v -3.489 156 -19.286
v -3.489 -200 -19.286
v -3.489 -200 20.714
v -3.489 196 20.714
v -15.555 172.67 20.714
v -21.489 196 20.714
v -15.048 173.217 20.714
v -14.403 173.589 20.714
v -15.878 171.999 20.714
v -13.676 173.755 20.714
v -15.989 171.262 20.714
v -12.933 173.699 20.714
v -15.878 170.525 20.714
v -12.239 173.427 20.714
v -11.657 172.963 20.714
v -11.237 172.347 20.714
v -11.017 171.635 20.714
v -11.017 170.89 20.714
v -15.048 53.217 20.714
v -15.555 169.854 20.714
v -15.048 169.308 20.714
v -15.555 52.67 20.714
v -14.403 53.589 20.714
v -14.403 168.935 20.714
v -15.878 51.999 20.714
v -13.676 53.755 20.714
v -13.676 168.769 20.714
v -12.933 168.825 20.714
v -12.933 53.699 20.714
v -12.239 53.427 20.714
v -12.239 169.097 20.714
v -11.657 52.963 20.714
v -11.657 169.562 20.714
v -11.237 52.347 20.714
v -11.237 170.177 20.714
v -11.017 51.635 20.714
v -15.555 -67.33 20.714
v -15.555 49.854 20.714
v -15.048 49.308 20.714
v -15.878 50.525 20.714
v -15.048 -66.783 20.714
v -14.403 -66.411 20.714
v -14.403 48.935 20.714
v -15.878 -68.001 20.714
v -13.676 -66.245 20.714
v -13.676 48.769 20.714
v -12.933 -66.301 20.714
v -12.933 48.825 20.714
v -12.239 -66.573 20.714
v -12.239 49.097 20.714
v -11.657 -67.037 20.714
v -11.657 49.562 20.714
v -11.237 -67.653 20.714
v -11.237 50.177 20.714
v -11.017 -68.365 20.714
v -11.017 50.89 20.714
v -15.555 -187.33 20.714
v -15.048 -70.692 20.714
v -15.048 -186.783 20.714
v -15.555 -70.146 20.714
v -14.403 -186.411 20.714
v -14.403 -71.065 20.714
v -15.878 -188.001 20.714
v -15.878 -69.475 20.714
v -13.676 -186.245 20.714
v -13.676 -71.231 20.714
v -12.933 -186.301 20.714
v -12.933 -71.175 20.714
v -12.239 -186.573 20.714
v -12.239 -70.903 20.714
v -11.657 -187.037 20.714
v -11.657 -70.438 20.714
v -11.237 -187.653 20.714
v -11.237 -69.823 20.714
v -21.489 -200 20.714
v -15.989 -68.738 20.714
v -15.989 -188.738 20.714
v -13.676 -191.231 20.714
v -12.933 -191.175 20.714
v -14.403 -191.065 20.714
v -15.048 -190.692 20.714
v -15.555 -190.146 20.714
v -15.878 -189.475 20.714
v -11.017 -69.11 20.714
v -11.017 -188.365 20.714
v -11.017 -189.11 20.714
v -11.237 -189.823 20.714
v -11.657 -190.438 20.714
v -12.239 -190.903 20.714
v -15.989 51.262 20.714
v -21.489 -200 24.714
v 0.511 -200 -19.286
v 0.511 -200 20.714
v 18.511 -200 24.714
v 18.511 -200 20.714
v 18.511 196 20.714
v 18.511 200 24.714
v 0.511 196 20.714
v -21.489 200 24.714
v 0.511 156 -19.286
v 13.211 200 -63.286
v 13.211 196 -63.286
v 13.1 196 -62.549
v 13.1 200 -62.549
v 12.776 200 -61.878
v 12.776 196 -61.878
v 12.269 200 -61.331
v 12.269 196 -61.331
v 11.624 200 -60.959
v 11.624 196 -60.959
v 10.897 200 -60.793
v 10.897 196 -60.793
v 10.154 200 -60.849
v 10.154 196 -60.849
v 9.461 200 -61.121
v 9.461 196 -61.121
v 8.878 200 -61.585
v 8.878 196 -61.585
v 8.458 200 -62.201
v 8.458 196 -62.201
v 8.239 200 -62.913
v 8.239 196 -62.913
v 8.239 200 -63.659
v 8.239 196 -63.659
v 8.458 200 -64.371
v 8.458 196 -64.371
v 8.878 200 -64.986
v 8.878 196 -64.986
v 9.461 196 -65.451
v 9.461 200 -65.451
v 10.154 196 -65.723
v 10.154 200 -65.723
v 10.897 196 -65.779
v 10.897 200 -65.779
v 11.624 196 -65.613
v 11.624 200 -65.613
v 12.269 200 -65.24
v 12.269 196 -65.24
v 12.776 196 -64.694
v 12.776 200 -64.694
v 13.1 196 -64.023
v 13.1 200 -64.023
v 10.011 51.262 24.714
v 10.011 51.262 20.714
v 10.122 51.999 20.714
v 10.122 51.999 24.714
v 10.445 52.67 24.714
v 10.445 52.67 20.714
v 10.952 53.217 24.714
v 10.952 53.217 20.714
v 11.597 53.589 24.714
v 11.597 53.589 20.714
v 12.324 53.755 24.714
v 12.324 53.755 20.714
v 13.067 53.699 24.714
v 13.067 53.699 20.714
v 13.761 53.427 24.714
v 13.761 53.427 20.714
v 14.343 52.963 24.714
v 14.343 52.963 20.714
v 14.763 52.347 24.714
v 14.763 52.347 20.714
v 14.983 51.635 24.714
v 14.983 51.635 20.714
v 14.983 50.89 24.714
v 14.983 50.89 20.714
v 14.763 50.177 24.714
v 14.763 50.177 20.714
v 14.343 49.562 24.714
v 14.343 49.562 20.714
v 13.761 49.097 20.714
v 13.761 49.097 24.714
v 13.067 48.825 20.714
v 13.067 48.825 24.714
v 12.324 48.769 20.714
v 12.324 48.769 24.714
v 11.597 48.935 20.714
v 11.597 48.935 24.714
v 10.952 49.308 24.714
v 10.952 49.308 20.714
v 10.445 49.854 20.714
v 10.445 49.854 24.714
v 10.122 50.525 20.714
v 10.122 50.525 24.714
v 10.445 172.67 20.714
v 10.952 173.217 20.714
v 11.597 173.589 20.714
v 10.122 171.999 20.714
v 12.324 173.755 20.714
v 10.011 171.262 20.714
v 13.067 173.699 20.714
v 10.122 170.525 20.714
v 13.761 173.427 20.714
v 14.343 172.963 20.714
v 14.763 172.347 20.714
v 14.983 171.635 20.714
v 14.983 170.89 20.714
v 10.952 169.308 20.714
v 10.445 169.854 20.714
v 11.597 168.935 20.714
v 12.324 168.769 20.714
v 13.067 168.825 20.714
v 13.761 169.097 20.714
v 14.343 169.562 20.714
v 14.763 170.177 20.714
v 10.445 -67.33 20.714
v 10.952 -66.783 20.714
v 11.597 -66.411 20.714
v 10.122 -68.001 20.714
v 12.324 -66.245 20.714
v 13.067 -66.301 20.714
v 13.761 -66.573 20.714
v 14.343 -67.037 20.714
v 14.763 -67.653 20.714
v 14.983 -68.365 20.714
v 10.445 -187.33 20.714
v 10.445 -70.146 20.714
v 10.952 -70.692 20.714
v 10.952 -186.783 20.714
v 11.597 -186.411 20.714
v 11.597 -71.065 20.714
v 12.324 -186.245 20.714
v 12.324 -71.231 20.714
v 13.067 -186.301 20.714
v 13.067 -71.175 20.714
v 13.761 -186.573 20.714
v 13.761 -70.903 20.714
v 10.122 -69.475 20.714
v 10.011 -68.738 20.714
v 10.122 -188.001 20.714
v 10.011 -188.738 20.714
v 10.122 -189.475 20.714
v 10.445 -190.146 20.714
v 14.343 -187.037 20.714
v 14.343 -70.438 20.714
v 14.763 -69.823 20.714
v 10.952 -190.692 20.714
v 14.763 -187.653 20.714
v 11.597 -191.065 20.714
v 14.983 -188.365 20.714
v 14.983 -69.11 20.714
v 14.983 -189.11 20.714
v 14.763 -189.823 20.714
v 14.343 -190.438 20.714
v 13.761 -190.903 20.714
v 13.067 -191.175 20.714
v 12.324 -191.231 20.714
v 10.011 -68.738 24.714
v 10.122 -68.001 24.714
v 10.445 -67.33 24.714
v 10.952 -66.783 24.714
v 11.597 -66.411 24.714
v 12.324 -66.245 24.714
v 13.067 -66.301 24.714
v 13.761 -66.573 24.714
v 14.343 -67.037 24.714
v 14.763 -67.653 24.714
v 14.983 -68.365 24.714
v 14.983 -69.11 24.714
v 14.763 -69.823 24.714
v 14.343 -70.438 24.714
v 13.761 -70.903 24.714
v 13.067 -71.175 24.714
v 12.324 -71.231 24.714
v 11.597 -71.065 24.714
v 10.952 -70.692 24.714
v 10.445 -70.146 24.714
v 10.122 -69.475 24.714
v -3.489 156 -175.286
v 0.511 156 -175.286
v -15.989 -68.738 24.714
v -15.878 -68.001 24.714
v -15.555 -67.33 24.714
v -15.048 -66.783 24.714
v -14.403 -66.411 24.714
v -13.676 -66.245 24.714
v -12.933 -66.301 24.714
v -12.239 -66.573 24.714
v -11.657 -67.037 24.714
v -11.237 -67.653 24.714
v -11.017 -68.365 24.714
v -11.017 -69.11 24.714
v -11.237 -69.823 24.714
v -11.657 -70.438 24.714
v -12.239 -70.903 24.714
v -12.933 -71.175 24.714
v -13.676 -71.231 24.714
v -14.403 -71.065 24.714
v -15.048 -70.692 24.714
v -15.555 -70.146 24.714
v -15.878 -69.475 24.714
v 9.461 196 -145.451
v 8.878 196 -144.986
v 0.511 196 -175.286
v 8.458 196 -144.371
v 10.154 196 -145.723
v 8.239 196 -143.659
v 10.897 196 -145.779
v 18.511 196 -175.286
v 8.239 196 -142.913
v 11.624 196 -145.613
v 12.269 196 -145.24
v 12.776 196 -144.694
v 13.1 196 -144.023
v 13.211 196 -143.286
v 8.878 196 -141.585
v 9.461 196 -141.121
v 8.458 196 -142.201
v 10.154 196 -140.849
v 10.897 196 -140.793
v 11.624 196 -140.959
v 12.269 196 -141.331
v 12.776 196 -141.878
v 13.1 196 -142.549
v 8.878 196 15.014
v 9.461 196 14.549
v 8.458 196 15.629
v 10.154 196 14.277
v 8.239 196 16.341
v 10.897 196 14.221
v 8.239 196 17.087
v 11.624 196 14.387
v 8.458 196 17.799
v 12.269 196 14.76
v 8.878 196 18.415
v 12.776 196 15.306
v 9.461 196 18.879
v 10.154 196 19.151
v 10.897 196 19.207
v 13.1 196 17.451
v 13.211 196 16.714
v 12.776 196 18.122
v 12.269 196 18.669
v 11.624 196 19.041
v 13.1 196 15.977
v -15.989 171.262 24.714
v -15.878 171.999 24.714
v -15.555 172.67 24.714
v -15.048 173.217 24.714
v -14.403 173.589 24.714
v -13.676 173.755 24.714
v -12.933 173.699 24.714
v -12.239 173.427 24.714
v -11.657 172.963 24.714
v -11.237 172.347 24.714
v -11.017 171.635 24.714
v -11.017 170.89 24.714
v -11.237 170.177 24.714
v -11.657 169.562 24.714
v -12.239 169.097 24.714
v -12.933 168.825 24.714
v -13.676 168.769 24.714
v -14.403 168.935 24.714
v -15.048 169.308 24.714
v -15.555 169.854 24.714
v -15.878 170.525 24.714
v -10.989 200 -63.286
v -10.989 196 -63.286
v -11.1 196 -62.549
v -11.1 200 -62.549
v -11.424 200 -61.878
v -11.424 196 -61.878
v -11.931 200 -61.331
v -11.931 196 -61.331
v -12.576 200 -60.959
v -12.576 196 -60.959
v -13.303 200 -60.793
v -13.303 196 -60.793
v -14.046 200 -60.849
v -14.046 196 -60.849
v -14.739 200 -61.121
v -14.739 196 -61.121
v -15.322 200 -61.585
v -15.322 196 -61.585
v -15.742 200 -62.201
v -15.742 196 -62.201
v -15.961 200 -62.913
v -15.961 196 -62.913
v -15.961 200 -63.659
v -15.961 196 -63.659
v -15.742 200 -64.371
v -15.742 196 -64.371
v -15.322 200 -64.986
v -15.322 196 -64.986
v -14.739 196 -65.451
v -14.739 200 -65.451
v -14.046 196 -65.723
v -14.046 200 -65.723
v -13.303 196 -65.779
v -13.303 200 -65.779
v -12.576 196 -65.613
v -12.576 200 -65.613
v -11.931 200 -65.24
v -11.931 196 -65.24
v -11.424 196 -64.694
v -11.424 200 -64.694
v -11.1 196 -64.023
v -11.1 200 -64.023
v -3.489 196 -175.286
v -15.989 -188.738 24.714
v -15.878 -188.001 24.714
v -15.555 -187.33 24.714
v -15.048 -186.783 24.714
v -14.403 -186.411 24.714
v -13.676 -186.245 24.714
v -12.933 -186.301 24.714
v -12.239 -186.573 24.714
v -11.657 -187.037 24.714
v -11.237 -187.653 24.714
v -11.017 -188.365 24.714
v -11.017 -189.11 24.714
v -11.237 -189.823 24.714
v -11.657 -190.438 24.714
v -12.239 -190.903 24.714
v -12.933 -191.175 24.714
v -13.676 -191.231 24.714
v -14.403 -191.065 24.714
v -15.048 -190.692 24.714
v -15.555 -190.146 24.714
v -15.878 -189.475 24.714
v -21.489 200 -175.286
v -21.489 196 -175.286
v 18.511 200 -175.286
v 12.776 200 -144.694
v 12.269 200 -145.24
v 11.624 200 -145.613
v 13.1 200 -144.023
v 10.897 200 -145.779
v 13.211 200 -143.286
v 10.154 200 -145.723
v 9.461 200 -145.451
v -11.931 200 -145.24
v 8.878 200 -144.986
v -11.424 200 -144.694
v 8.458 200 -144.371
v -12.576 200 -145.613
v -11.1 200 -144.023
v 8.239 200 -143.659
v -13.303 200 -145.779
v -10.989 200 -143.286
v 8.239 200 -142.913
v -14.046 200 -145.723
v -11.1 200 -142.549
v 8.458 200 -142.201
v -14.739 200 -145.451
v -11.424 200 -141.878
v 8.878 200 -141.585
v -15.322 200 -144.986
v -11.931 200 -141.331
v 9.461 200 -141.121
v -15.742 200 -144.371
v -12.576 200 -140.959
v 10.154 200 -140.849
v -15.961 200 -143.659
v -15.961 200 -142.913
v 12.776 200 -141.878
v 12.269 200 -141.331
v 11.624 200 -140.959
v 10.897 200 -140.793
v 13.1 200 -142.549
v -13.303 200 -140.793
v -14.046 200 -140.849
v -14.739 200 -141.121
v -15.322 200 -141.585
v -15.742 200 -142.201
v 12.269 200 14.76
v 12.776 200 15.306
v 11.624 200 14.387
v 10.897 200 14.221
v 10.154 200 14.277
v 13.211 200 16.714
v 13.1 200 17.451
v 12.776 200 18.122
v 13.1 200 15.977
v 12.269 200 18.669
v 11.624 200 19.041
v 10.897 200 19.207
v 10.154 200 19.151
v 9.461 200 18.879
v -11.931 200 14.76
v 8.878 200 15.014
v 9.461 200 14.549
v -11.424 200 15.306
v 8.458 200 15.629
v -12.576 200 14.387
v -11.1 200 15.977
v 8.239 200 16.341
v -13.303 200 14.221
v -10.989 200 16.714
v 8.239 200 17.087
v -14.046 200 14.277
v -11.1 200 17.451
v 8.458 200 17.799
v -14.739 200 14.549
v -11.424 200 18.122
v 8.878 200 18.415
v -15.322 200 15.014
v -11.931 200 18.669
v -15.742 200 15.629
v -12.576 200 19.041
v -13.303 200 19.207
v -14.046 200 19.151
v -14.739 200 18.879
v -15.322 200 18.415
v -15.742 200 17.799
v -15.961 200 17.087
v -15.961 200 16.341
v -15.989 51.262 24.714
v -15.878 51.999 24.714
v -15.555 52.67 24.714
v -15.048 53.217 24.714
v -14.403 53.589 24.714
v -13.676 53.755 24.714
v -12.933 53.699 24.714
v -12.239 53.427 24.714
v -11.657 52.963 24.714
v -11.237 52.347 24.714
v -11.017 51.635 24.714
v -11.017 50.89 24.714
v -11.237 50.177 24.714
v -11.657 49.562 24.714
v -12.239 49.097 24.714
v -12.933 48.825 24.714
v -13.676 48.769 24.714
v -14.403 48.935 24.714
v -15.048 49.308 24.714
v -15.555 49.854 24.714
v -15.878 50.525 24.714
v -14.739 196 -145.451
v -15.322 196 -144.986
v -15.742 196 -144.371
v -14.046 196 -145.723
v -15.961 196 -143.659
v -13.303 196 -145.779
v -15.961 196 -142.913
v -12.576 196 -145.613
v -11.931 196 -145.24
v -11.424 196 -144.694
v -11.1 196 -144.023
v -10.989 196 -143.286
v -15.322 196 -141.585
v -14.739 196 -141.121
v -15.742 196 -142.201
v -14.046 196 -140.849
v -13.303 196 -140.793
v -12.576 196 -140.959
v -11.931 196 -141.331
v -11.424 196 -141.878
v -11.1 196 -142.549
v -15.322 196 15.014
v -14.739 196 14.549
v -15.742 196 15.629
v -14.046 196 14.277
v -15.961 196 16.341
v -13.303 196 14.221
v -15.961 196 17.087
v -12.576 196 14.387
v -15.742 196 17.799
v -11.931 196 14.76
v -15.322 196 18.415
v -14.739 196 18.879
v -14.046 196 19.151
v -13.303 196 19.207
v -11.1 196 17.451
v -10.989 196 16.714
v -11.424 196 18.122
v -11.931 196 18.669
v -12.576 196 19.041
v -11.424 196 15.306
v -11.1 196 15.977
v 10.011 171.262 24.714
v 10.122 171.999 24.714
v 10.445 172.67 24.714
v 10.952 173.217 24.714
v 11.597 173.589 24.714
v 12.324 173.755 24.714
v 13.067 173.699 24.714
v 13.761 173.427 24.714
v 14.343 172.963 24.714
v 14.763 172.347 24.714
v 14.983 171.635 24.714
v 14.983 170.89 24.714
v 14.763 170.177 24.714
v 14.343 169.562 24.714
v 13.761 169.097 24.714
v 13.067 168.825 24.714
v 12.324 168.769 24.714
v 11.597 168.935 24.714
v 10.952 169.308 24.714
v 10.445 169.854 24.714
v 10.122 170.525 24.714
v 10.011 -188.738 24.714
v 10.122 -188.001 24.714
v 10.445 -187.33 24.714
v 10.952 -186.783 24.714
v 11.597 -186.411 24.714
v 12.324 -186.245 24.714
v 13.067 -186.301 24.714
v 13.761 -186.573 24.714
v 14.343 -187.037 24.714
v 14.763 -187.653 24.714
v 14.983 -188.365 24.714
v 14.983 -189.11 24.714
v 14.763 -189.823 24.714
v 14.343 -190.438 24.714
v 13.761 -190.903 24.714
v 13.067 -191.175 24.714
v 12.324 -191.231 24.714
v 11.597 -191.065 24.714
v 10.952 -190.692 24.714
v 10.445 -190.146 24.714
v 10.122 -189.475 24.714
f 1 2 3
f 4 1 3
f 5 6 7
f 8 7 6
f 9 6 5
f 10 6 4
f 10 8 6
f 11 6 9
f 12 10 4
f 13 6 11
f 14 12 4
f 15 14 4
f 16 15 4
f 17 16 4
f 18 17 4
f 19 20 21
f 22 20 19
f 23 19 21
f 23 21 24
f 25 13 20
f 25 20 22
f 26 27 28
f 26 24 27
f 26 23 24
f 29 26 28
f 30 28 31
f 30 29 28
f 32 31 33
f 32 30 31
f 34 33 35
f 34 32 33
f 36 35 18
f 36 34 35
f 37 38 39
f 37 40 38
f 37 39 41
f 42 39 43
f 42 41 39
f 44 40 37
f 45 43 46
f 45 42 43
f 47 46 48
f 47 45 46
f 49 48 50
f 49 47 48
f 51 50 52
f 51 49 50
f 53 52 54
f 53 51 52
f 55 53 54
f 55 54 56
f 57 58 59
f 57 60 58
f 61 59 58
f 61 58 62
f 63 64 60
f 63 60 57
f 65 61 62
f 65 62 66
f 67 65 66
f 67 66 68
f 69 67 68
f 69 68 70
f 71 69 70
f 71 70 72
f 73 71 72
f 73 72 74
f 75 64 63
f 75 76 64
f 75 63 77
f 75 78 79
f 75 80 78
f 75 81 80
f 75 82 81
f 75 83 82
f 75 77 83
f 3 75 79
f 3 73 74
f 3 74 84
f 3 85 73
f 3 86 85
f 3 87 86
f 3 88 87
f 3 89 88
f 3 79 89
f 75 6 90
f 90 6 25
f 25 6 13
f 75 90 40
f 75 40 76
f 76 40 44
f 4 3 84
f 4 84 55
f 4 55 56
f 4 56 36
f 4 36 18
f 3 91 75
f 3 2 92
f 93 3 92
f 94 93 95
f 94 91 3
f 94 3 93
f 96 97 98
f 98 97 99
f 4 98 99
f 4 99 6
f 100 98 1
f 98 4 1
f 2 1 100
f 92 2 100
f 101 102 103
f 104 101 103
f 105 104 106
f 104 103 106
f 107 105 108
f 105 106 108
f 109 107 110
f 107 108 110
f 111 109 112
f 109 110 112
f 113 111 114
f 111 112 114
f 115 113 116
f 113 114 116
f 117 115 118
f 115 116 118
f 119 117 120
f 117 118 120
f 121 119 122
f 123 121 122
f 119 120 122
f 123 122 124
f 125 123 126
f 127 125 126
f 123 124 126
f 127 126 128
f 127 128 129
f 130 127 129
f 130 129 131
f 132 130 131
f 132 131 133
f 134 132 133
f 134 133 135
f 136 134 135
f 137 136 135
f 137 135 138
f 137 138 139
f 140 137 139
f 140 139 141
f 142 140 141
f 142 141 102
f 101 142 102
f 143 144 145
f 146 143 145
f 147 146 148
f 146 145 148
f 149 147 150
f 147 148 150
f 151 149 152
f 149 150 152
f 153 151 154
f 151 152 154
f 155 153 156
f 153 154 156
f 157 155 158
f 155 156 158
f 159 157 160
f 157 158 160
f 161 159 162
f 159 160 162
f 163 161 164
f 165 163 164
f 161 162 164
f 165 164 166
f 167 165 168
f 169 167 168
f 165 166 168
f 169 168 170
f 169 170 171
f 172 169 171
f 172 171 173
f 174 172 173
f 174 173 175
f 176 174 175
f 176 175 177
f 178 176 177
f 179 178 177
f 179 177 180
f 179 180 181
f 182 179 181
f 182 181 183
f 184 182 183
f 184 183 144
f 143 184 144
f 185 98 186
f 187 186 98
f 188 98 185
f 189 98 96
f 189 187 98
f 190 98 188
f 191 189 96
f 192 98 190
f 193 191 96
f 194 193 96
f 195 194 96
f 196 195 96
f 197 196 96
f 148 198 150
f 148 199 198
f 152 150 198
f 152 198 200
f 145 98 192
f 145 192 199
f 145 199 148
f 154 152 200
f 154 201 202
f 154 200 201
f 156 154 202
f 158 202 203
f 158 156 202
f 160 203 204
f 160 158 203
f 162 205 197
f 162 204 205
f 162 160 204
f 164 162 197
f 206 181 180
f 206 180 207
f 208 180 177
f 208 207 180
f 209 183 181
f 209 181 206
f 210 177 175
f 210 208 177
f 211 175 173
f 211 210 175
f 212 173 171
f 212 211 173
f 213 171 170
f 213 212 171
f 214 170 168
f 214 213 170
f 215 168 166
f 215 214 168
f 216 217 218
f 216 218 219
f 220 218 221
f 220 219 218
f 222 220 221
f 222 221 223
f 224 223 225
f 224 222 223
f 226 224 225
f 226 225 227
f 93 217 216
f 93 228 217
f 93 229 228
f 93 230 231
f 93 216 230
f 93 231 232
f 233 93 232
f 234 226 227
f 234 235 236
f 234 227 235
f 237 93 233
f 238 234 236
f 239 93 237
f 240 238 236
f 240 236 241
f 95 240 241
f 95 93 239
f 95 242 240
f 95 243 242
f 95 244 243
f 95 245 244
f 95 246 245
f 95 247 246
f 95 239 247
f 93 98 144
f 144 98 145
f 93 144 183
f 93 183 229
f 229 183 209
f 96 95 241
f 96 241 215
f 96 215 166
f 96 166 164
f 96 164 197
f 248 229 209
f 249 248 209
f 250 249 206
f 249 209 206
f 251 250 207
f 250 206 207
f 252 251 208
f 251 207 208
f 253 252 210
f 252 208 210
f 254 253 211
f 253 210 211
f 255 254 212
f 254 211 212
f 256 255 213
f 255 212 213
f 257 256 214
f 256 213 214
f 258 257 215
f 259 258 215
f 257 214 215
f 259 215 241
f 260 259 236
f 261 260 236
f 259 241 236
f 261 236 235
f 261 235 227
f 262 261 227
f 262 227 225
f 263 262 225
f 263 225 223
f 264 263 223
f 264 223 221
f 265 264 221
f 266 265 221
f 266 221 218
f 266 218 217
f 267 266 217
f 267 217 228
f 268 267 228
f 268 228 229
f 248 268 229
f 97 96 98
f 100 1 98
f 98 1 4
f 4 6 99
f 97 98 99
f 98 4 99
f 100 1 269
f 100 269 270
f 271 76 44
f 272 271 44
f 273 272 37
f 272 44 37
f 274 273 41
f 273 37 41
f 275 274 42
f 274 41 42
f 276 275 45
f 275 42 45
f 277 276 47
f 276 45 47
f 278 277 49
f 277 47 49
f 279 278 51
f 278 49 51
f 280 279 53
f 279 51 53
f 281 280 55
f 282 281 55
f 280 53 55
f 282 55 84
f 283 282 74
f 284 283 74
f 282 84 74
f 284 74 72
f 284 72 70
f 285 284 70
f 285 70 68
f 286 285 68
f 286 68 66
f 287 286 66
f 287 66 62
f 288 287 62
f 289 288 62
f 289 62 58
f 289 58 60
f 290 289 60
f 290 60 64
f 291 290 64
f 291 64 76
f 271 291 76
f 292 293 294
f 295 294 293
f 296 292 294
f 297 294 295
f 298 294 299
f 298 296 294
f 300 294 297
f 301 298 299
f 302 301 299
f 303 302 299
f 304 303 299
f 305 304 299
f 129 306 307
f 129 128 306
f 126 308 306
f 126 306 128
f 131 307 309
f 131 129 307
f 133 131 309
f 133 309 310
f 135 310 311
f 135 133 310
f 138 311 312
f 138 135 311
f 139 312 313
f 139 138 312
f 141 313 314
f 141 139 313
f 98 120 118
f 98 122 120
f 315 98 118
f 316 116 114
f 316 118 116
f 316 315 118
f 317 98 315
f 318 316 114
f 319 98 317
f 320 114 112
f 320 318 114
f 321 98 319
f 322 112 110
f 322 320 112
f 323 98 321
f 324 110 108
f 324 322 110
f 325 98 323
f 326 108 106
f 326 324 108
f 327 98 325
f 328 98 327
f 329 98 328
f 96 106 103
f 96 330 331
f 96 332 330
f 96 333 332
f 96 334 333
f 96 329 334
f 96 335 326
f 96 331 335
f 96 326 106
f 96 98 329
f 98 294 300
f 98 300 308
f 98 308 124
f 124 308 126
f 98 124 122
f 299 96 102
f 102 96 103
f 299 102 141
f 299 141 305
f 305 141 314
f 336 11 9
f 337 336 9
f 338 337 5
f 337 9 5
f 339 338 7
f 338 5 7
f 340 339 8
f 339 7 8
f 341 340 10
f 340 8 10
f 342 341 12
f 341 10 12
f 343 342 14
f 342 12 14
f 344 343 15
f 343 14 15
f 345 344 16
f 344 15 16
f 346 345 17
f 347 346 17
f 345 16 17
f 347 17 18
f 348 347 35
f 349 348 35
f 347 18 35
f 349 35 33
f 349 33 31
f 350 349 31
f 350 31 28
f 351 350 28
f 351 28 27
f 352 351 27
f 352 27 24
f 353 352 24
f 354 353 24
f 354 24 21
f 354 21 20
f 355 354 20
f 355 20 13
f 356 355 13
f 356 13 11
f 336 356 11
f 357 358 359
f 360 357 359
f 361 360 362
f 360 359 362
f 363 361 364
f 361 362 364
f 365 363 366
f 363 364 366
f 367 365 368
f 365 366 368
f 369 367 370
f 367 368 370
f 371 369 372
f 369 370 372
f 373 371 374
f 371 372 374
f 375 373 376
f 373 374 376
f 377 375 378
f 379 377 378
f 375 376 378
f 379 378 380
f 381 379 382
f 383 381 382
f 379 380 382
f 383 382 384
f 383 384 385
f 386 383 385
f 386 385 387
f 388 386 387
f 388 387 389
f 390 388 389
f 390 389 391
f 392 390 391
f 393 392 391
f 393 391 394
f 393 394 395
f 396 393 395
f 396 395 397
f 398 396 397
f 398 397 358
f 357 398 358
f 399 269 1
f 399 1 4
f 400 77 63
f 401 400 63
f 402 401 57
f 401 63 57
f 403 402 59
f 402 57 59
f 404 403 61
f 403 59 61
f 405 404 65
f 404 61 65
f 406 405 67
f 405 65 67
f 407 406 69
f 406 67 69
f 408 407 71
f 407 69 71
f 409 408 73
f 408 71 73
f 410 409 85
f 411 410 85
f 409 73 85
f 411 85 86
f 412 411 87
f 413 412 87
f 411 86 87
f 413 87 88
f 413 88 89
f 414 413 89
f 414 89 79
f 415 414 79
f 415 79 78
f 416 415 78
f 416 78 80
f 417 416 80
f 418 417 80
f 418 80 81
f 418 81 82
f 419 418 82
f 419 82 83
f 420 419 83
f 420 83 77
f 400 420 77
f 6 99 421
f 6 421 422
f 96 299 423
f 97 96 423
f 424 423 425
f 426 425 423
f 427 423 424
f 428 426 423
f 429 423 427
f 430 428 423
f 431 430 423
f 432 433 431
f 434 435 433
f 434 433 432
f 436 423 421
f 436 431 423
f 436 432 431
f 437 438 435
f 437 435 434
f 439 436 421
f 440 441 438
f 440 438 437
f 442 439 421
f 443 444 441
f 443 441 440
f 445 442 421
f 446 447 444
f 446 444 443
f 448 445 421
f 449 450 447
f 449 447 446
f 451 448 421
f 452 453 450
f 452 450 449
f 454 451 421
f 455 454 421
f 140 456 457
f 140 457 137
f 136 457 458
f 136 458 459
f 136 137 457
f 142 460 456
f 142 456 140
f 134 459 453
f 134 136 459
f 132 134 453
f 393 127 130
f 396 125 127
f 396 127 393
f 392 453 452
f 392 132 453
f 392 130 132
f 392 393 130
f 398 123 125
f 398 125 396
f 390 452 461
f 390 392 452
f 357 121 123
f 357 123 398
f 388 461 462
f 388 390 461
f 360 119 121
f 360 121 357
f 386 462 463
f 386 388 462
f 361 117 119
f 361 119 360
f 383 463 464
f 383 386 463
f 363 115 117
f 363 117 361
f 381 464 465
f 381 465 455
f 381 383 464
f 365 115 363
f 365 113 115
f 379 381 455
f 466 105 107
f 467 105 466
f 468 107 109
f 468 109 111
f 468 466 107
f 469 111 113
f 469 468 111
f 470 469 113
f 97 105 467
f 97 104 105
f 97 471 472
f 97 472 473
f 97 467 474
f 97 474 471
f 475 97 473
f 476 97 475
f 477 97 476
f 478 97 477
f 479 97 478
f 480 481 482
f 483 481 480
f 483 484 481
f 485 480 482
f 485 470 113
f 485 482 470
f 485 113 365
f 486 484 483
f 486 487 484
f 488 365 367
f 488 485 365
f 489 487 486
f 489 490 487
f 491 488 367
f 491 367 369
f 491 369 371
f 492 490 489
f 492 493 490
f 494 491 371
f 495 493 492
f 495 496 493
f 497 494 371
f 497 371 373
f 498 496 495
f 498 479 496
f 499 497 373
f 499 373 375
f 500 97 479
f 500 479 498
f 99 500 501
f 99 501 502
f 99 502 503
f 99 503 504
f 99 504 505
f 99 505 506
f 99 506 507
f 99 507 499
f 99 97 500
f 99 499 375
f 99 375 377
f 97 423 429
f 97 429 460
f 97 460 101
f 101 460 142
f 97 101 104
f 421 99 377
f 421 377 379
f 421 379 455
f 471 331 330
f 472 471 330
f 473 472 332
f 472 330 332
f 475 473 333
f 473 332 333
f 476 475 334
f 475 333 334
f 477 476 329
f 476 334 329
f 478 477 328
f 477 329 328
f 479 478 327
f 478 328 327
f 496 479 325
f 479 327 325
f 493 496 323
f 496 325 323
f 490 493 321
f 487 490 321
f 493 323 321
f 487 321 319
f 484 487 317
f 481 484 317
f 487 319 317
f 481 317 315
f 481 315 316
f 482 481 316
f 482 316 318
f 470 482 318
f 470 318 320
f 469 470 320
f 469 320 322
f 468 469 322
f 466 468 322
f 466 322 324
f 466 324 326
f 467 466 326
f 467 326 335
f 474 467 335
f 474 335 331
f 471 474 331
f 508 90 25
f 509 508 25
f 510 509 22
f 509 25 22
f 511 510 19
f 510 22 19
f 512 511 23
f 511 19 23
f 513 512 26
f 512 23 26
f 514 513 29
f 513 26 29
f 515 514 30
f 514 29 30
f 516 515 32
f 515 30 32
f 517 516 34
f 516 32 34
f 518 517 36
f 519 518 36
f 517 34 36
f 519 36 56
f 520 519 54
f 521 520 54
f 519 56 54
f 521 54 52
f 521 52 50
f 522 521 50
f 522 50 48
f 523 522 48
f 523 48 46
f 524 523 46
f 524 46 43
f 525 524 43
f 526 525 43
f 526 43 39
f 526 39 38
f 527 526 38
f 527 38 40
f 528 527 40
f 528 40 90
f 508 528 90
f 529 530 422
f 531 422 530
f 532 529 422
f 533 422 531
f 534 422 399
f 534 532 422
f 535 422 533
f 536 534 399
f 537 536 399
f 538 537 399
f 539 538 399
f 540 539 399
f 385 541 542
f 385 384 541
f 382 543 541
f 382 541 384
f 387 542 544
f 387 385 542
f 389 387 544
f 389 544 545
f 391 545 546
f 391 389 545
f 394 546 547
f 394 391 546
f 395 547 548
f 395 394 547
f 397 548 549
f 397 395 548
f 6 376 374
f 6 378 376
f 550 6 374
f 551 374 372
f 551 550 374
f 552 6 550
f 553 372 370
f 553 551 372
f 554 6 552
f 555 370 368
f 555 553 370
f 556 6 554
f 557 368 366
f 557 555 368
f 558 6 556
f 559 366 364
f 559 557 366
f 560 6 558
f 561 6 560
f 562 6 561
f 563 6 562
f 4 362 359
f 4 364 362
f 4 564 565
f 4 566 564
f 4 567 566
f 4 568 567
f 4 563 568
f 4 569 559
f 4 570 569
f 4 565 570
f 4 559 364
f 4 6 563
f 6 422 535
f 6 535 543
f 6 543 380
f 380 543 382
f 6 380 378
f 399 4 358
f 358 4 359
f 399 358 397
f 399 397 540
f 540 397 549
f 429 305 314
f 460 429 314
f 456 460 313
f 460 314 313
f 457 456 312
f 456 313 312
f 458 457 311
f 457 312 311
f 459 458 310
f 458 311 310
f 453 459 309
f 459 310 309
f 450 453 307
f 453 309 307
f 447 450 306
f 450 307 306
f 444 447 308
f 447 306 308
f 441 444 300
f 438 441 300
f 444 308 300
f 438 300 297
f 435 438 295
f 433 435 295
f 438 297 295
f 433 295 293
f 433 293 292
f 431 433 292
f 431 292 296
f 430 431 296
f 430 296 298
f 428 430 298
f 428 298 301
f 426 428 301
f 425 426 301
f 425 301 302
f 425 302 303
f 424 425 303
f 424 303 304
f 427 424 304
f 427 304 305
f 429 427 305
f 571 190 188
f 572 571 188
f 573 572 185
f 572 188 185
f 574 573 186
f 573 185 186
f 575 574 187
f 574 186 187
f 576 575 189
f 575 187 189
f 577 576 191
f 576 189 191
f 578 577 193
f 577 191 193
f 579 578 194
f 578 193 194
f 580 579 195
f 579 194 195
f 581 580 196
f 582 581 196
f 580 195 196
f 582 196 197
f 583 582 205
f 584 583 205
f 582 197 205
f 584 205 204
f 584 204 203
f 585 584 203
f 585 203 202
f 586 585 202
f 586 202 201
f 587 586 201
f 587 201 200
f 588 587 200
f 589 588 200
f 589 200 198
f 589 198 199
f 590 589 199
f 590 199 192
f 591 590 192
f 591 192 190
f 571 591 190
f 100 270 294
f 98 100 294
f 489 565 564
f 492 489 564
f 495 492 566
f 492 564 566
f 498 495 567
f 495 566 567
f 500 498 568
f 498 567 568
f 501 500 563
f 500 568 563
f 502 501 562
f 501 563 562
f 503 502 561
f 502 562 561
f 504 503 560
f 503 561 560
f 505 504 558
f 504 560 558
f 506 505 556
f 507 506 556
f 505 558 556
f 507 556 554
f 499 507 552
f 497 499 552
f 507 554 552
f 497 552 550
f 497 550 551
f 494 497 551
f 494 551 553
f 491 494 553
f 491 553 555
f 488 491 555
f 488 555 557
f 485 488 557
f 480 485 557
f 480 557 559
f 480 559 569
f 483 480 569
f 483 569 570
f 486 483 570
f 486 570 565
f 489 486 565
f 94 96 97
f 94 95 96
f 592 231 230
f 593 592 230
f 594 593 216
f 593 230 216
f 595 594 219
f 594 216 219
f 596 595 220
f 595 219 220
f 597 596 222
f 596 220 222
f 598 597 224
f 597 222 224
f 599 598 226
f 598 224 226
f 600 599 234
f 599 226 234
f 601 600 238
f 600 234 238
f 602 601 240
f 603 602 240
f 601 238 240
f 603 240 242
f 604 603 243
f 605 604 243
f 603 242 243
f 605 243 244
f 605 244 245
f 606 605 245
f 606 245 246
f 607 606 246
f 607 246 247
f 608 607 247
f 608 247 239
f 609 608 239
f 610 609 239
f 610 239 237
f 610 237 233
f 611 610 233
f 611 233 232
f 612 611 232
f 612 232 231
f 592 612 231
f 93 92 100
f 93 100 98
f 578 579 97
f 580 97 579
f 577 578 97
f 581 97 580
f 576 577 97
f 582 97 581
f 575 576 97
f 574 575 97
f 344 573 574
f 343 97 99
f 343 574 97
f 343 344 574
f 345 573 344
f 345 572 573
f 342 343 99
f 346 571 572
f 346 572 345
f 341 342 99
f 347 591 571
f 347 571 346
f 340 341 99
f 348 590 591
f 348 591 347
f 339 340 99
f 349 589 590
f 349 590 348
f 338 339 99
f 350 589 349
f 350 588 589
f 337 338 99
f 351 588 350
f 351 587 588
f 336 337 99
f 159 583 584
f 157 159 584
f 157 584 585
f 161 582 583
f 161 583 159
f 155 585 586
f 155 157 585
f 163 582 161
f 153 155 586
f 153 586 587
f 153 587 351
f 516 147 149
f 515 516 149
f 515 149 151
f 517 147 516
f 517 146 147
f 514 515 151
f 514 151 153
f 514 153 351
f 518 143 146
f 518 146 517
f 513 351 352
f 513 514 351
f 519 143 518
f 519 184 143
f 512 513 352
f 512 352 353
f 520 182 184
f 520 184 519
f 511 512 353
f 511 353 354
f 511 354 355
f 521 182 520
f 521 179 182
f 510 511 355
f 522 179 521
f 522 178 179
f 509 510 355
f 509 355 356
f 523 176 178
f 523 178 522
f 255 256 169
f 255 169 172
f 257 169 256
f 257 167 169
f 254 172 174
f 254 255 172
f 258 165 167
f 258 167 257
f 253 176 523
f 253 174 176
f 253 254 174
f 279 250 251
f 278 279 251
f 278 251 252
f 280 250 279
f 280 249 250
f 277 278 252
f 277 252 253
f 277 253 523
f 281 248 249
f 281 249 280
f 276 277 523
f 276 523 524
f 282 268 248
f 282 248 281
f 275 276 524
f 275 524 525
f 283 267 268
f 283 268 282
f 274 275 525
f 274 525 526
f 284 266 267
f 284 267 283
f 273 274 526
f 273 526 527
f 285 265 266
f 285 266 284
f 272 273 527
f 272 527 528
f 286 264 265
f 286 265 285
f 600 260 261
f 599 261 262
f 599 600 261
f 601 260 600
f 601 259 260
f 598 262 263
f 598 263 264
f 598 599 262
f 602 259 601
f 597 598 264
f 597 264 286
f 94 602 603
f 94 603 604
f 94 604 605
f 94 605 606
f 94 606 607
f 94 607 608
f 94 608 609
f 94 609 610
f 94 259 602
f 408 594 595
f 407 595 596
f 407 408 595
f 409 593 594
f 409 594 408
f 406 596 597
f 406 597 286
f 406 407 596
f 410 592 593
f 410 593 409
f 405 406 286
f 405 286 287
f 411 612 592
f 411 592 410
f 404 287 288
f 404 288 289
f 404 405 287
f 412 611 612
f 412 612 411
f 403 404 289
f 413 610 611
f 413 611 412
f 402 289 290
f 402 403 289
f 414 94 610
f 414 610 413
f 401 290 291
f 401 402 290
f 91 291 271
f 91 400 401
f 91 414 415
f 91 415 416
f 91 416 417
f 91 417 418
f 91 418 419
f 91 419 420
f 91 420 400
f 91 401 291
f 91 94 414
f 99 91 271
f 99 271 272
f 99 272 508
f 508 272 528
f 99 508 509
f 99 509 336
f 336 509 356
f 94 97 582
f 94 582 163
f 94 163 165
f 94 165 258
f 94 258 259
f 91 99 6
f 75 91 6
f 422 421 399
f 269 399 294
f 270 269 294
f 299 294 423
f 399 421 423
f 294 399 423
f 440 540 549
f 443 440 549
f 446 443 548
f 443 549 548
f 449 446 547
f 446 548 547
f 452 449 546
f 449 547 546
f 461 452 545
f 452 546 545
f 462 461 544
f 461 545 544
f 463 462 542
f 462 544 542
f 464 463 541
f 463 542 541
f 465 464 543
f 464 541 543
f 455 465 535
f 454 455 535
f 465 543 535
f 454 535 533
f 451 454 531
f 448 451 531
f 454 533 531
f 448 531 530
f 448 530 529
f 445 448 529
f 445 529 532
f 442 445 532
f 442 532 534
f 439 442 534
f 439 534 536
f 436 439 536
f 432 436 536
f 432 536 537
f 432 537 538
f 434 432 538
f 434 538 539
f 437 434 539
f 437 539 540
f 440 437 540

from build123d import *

# Parameters (mm, degrees)
F0_W     = 4
F0_H     = 40
F1_DEPTH = 200
F3_DEPTH = 51.9
F4_W     = 4
F4_H     = 40
F5_DEPTH = 200
F7_DEPTH = 41.7
F9_D     = 5
F11_D    = 5


with BuildPart() as f1:
    # F0 (on Front) → F1 (new body, symmetric)
    with BuildSketch(Plane.XZ):
        Polygon((18.5106403343, 24.7140824073), (-21.4893596657, 24.7140824073), (-21.4893596657, 20.7140824073), (-3.4893596657, 20.7140824073), (0.5106403343, 20.7140824073), (18.5106403343, 20.7140824073), align=None)
        with Locations((-1.4893596657, 0.7140824073)):
            Rectangle(F0_W, F0_H)
    extrude(amount=F1_DEPTH, both=True)

    # F2 (on face) → F3 (cut, symmetric)
    with BuildSketch(Plane(origin=(-21.4893596657, 0, 0), x_dir=(0, -1, 0), z_dir=(-1, 0, 0))):
        Polygon((-107.6650425279, -67.6208750648), (-196, 20.7140824073), (-200, 20.7140824073), (-200, -67.6208750648), align=None)
        Polygon((-196, 20.7140824073), (-200, 24.7140824073), (-200, 20.7140824073), align=None)
    extrude(amount=F3_DEPTH, both=True, mode=Mode.SUBTRACT)

    # F9 (through all)
    with Locations(Plane.XY.offset(24.7140824073)):
        with Locations((-13.4893596657, 171.2621307373), (12.5106403343, 171.2621307373), (12.5106403343, 51.2621307373), (-13.4893596657, 51.2621307373), (-13.4893596657, -68.7378692627), (12.5106403343, -68.7378692627), (-13.4893596657, -188.7378692627), (12.5106403343, -188.7378692627)):
            Hole(F9_D / 2)


with BuildPart() as f5:
    # F4 (on face) → F5 (new body)
    with BuildSketch(Plane.XY.offset(24.7140824073)):
        Polygon((18.5106403343, 200), (-21.4893596657, 200), (-21.4893596657, 196), (-3.4893596657, 196), (0.5106403343, 196), (18.5106403343, 196), align=None)
        with Locations((-1.4893596657, 176)):
            Rectangle(F4_W, F4_H)
    extrude(amount=-F5_DEPTH)

    # F6 (on face) → F7 (cut)
    with BuildSketch(Plane(origin=(-21.4893596657, 0, 0), x_dir=(0, -1, 0), z_dir=(-1, 0, 0))):
        Polygon((-196, 24.7140824073), (-196, 20.7140824073), (-144.8176057225, -30.4683118701), (-144.8176057225, 24.7140824073), align=None)
        Polygon((-196, 24.7140824073), (-200, 24.7140824073), (-196, 20.7140824073), align=None)
    extrude(amount=-F7_DEPTH, mode=Mode.SUBTRACT)

    # F11 (through all)
    with Locations(Plane(origin=(0, 200, 0), x_dir=(-1, 0, 0), z_dir=(0, 1, 0))):
        with Locations((-10.7106403343, 16.7140824073), (13.4893596657, 16.7140824073), (13.4893596657, -63.2859175927), (-10.7106403343, -63.2859175927), (-10.7106403343, -143.2859175927), (13.4893596657, -143.2859175927)):
            Hole(F11_D / 2)


solid = Compound([f1.part, f5.part])
